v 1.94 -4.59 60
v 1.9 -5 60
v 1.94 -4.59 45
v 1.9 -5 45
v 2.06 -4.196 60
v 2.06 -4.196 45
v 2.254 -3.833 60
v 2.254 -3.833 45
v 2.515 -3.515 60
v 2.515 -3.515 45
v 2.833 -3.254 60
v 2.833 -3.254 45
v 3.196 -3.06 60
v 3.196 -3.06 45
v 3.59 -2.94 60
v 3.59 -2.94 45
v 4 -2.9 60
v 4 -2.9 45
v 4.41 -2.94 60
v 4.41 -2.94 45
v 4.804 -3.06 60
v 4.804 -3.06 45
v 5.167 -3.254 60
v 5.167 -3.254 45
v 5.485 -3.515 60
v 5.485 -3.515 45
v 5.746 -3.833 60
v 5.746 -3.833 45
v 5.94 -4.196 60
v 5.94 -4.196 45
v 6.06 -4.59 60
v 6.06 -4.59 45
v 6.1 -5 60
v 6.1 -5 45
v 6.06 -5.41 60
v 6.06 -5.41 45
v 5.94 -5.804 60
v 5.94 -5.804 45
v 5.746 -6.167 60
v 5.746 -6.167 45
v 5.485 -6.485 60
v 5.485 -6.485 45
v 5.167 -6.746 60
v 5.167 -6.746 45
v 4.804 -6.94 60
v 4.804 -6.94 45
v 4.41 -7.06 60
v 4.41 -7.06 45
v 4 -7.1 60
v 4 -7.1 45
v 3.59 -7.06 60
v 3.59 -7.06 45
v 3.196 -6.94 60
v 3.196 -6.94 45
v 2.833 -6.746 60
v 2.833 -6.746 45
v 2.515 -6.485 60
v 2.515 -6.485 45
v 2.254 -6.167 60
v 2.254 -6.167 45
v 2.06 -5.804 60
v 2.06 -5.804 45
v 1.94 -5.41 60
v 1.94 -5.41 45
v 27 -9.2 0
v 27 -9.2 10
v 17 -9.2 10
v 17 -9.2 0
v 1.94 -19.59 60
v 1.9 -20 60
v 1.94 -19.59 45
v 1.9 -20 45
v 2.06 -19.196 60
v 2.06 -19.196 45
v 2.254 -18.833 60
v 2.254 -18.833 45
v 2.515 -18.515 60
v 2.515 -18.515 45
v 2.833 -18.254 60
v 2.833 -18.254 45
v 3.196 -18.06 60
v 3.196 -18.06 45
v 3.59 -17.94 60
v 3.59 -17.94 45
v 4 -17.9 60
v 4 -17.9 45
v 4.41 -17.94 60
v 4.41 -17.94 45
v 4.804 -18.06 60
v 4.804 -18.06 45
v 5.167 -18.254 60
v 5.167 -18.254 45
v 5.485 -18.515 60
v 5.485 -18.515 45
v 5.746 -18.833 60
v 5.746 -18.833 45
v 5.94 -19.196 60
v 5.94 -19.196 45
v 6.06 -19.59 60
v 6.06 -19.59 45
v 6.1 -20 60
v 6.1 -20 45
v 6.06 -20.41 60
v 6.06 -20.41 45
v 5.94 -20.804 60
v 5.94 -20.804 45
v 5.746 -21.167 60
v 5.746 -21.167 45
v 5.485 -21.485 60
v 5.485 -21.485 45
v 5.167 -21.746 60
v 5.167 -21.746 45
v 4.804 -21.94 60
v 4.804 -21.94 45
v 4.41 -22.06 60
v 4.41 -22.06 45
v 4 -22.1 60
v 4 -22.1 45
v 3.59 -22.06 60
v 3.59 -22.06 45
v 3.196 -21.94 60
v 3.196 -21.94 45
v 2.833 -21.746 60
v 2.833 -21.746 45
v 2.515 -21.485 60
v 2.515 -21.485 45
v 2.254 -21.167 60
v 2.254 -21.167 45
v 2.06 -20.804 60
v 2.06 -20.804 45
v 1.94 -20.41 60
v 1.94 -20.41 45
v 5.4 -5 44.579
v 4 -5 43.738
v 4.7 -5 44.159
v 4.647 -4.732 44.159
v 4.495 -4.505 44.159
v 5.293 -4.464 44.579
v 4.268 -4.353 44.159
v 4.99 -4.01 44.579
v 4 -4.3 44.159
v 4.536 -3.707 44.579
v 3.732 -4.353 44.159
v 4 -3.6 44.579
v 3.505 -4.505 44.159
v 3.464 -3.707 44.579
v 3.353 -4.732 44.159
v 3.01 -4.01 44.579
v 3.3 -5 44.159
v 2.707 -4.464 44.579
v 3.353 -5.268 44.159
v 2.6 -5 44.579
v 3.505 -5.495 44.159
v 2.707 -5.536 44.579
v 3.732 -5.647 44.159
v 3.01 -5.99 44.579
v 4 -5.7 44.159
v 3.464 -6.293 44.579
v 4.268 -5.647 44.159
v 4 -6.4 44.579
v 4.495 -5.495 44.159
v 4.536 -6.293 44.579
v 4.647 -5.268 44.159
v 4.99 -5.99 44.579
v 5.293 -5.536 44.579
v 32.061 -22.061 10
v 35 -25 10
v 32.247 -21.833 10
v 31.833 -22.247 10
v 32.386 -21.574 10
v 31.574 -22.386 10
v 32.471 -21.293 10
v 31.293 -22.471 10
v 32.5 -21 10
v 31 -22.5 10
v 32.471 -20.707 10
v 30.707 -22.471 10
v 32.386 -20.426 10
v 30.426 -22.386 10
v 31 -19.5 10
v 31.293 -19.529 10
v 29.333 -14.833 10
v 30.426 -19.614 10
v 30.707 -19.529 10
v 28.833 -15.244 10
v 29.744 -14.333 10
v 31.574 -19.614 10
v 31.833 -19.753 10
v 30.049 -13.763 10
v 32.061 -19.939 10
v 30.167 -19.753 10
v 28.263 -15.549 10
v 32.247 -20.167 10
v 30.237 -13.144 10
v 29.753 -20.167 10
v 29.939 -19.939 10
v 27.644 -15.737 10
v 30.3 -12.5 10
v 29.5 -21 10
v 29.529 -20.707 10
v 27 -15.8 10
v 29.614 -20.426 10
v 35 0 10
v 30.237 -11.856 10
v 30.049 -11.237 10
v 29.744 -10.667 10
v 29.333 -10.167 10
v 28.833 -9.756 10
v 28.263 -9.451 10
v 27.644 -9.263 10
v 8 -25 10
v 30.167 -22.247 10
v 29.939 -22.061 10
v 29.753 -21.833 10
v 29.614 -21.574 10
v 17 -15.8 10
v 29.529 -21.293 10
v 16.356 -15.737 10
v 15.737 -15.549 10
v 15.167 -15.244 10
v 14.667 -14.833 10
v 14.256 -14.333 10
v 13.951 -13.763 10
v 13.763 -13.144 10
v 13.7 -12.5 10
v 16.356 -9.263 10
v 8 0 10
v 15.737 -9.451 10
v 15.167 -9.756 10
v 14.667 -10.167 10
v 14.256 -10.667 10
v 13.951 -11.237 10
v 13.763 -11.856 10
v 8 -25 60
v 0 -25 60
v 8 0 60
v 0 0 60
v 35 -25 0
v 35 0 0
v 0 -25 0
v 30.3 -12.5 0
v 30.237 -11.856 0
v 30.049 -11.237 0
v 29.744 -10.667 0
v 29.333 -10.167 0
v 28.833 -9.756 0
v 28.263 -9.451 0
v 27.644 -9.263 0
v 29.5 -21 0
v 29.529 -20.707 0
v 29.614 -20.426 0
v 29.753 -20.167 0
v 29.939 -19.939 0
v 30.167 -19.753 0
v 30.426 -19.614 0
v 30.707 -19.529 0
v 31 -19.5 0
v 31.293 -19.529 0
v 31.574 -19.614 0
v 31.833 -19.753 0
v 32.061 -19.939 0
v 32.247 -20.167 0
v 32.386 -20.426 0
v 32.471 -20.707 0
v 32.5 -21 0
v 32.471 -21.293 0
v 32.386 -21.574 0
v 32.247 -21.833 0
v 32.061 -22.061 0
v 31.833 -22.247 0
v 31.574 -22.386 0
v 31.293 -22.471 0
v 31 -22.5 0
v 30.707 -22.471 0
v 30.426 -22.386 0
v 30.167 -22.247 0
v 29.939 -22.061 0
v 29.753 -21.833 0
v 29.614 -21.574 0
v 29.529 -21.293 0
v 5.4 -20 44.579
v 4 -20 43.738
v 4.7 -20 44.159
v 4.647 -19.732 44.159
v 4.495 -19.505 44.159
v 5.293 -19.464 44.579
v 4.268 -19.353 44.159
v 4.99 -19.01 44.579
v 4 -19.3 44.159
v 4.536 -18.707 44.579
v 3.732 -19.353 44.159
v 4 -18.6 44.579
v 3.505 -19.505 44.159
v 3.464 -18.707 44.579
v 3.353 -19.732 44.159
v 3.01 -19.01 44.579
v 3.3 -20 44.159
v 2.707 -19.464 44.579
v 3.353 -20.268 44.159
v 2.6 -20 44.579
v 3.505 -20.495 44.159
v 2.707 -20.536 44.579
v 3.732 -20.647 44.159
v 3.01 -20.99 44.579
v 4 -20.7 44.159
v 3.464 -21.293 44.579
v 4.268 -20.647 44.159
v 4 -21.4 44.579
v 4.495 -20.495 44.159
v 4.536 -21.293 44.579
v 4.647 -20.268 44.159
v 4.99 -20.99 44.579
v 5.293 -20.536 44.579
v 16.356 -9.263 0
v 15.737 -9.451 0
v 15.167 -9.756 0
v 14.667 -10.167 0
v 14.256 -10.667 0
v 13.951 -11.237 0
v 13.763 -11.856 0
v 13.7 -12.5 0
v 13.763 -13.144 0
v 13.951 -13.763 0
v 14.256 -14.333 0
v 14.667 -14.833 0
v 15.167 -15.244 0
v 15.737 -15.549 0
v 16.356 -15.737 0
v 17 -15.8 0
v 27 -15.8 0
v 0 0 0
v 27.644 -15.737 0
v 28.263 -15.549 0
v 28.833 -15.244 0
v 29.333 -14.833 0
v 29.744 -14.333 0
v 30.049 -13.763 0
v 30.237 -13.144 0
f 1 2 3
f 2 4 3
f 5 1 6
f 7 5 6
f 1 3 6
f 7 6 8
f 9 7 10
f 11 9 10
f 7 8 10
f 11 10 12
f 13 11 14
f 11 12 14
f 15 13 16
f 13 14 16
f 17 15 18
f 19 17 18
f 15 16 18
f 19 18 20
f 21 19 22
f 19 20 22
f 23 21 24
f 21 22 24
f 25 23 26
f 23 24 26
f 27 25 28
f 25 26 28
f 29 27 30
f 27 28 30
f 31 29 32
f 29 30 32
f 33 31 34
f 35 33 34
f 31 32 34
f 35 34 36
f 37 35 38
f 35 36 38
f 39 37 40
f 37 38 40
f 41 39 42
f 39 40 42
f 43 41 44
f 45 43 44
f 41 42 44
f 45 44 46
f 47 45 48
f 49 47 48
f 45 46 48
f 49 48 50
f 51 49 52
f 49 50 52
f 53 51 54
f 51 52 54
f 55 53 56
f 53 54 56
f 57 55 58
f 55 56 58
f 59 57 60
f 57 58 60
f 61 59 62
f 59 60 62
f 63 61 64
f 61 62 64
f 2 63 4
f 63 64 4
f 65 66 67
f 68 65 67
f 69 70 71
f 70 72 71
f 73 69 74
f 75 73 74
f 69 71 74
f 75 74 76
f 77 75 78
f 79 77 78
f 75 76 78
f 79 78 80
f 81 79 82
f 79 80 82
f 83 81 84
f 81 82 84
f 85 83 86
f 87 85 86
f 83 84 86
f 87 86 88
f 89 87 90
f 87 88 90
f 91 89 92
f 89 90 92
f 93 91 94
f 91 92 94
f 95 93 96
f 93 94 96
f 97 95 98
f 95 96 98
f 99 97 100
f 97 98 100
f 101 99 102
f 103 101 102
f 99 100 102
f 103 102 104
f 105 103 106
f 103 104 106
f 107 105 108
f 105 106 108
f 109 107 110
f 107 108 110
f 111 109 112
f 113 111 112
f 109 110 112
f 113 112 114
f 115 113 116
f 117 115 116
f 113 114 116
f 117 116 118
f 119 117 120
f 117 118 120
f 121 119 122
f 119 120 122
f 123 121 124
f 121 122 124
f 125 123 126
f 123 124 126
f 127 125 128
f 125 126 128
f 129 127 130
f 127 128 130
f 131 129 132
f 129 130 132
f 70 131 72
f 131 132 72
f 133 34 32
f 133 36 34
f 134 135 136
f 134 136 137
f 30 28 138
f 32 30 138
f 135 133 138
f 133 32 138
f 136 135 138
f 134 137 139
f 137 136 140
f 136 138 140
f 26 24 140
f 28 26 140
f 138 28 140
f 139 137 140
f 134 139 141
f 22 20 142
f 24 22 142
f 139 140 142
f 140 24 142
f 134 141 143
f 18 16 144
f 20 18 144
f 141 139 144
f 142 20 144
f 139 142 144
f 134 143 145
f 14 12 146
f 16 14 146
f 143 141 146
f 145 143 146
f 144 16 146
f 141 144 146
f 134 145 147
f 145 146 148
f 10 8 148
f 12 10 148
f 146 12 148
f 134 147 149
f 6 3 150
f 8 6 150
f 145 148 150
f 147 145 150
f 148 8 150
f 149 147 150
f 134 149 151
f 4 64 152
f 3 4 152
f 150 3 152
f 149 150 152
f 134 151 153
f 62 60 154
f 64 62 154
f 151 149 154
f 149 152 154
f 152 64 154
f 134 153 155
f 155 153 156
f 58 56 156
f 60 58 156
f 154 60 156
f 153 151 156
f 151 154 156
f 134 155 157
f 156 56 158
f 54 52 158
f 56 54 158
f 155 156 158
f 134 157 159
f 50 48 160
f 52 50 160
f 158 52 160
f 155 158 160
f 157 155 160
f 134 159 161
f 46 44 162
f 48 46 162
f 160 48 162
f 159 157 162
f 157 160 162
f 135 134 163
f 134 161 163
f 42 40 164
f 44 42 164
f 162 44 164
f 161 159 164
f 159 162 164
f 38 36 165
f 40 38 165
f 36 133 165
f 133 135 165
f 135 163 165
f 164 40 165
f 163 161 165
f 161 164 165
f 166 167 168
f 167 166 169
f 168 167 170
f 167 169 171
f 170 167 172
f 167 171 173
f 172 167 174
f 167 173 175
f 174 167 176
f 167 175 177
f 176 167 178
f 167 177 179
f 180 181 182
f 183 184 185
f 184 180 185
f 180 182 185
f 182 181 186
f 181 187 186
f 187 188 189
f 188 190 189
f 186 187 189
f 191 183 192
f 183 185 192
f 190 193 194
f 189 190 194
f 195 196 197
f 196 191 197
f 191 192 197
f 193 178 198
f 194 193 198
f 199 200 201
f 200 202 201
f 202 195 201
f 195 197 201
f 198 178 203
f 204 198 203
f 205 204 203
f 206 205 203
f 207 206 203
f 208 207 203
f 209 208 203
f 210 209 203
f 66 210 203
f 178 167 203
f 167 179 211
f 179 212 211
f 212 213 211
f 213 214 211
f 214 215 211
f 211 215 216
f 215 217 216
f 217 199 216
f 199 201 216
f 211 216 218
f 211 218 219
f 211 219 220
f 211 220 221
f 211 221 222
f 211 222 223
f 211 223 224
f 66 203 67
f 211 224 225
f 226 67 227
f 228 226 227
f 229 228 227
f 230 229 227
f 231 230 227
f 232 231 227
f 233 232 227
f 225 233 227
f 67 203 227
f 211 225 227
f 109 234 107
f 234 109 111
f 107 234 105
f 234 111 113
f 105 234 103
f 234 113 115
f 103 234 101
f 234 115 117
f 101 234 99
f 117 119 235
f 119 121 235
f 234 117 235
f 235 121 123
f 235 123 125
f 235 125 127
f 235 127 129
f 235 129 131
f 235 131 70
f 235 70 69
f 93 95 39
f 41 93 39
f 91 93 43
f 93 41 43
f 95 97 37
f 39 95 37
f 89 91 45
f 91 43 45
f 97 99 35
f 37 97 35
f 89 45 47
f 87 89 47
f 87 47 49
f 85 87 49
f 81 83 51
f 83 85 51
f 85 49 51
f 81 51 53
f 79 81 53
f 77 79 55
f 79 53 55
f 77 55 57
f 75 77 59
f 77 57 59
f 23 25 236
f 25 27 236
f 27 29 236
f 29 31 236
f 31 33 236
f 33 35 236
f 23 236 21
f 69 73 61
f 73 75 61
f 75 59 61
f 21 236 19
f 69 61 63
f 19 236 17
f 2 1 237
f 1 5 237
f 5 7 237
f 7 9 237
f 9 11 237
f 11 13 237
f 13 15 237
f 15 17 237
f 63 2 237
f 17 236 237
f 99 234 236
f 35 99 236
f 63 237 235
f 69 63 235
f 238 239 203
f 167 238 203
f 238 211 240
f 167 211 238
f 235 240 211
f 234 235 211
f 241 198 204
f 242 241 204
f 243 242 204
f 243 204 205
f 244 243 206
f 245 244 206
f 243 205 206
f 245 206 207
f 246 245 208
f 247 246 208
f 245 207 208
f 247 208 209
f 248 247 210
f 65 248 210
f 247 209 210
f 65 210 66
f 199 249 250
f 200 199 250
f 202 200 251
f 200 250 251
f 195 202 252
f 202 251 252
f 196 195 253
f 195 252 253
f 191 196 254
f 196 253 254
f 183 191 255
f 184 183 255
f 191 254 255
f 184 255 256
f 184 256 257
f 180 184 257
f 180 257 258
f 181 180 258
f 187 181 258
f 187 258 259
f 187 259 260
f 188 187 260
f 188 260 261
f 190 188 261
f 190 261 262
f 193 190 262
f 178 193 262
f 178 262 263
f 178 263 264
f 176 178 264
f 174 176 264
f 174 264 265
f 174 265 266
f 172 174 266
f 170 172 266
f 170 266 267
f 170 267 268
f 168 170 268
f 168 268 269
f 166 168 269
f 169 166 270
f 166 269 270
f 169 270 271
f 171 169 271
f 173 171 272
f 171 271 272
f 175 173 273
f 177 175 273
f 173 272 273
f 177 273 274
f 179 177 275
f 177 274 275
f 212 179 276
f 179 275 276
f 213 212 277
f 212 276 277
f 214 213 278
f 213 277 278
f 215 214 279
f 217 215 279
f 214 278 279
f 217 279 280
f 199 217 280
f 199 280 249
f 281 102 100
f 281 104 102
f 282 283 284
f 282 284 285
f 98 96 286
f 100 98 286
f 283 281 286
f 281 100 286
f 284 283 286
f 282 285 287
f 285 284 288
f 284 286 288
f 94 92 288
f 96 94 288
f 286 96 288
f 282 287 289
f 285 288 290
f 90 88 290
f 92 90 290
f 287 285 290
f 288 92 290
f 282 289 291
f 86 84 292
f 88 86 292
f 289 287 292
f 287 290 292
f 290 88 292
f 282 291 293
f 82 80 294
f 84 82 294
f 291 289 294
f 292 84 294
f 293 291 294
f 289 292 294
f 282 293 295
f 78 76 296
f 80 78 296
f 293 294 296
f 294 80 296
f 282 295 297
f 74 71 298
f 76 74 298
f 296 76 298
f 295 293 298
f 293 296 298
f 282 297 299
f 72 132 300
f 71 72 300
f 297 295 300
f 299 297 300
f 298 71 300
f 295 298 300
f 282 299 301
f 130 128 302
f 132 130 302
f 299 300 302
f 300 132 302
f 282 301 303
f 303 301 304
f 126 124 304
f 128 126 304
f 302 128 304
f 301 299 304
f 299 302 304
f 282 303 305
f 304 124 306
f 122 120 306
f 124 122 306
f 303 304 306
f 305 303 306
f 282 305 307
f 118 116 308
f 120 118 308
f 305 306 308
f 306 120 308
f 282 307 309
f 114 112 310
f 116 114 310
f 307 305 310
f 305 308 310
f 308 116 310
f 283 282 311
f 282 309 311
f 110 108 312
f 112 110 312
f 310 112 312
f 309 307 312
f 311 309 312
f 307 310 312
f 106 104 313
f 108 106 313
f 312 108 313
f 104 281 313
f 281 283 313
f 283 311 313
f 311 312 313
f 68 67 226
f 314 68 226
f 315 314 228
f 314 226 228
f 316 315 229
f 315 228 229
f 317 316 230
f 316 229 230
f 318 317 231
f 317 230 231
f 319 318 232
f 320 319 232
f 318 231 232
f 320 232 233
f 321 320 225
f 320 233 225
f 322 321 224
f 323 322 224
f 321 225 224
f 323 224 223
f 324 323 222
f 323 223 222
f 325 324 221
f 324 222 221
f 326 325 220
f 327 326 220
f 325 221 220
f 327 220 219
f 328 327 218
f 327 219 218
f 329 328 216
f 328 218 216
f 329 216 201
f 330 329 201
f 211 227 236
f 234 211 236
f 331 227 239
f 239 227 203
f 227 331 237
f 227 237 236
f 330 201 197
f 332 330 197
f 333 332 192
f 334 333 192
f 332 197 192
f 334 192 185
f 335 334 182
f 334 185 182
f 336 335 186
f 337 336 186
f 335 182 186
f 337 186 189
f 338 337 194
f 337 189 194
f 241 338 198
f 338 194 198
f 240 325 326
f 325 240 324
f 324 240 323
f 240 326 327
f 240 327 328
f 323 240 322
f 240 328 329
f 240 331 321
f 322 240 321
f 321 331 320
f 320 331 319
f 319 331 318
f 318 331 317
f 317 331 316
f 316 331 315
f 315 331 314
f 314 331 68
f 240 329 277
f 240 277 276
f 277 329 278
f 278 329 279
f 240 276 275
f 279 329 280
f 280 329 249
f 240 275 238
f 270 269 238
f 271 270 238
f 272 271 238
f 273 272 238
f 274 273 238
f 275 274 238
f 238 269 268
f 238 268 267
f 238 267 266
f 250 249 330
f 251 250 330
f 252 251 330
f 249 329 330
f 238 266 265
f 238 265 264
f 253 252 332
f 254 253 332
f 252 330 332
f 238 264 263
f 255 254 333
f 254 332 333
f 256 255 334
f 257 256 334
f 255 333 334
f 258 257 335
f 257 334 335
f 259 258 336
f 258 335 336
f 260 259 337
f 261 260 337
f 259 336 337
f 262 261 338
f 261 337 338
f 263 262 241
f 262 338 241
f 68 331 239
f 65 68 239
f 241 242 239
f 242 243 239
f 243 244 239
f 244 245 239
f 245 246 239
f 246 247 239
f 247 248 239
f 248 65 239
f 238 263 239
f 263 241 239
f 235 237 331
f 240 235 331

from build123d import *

# Parameters (mm, degrees)
F1_DEPTH = 25
F3_D     = 4.2
F3_DEPTH = 15
F3_TIP   = 1.2618073
F5_DEPTH = 25
F6_D     = 3
F6_DEPTH = 15
F6_TIP   = 0.9012909285


with BuildPart() as f1:
    # F0 (on Front) → F1 (new body)
    with BuildSketch(Plane.XZ):
        Polygon((0, 60), (0, 0), (35, 0), (35, 10), (8, 10), (8, 60), align=None)
    extrude(amount=F1_DEPTH)

    # F3
    with Locations(Plane.XY.offset(60)):
        with Locations((4, -5), (4, -20)):
            Hole(F3_D / 2, depth=F3_DEPTH)
            with Locations((0, 0, -(F3_DEPTH + F3_TIP / 2))):  # 118° drill point
                Cone(0, F3_D / 2, F3_TIP, mode=Mode.SUBTRACT)

    # F4 (on face) → F5 (cut)
    with BuildSketch(Plane.XY.offset(10)):
        with BuildLine():
            ThreePointArc((27, -15.8), (29.3334523779, -14.8334523779), (30.3, -12.5))
            ThreePointArc((30.3, -12.5), (29.3334523779, -10.1665476221), (27, -9.2))
            Line((27, -9.2), (27, -15.8))
        make_face()
        with BuildLine():
            Line((27, -15.8), (27, -9.2))
            ThreePointArc((27, -9.2), (23.7, -12.5), (27, -15.8))
        make_face()
        with BuildLine():
            ThreePointArc((27, -15.8), (23.7, -12.5), (27, -9.2))
            Line((27, -9.2), (17, -9.2))
            ThreePointArc((17, -9.2), (19.3334523779, -10.1665476221), (20.3, -12.5))
            ThreePointArc((20.3, -12.5), (19.3334523779, -14.8334523779), (17, -15.8))
            Line((17, -15.8), (27, -15.8))
        make_face()
        with BuildLine():
            ThreePointArc((20.3, -12.5), (19.3334523779, -10.1665476221), (17, -9.2))
            ThreePointArc((17, -9.2), (13.7, -12.5), (17, -15.8))
            ThreePointArc((17, -15.8), (19.3334523779, -14.8334523779), (20.3, -12.5))
        make_face()
    extrude(amount=-F5_DEPTH, mode=Mode.SUBTRACT)

    # F6
    with Locations(Plane.XY.offset(10)):
        with Locations((31, -21)):
            Hole(F6_D / 2, depth=F6_DEPTH)
            with Locations((0, 0, -(F6_DEPTH + F6_TIP / 2))):  # 118° drill point
                Cone(0, F6_D / 2, F6_TIP, mode=Mode.SUBTRACT)


solid = f1.part
